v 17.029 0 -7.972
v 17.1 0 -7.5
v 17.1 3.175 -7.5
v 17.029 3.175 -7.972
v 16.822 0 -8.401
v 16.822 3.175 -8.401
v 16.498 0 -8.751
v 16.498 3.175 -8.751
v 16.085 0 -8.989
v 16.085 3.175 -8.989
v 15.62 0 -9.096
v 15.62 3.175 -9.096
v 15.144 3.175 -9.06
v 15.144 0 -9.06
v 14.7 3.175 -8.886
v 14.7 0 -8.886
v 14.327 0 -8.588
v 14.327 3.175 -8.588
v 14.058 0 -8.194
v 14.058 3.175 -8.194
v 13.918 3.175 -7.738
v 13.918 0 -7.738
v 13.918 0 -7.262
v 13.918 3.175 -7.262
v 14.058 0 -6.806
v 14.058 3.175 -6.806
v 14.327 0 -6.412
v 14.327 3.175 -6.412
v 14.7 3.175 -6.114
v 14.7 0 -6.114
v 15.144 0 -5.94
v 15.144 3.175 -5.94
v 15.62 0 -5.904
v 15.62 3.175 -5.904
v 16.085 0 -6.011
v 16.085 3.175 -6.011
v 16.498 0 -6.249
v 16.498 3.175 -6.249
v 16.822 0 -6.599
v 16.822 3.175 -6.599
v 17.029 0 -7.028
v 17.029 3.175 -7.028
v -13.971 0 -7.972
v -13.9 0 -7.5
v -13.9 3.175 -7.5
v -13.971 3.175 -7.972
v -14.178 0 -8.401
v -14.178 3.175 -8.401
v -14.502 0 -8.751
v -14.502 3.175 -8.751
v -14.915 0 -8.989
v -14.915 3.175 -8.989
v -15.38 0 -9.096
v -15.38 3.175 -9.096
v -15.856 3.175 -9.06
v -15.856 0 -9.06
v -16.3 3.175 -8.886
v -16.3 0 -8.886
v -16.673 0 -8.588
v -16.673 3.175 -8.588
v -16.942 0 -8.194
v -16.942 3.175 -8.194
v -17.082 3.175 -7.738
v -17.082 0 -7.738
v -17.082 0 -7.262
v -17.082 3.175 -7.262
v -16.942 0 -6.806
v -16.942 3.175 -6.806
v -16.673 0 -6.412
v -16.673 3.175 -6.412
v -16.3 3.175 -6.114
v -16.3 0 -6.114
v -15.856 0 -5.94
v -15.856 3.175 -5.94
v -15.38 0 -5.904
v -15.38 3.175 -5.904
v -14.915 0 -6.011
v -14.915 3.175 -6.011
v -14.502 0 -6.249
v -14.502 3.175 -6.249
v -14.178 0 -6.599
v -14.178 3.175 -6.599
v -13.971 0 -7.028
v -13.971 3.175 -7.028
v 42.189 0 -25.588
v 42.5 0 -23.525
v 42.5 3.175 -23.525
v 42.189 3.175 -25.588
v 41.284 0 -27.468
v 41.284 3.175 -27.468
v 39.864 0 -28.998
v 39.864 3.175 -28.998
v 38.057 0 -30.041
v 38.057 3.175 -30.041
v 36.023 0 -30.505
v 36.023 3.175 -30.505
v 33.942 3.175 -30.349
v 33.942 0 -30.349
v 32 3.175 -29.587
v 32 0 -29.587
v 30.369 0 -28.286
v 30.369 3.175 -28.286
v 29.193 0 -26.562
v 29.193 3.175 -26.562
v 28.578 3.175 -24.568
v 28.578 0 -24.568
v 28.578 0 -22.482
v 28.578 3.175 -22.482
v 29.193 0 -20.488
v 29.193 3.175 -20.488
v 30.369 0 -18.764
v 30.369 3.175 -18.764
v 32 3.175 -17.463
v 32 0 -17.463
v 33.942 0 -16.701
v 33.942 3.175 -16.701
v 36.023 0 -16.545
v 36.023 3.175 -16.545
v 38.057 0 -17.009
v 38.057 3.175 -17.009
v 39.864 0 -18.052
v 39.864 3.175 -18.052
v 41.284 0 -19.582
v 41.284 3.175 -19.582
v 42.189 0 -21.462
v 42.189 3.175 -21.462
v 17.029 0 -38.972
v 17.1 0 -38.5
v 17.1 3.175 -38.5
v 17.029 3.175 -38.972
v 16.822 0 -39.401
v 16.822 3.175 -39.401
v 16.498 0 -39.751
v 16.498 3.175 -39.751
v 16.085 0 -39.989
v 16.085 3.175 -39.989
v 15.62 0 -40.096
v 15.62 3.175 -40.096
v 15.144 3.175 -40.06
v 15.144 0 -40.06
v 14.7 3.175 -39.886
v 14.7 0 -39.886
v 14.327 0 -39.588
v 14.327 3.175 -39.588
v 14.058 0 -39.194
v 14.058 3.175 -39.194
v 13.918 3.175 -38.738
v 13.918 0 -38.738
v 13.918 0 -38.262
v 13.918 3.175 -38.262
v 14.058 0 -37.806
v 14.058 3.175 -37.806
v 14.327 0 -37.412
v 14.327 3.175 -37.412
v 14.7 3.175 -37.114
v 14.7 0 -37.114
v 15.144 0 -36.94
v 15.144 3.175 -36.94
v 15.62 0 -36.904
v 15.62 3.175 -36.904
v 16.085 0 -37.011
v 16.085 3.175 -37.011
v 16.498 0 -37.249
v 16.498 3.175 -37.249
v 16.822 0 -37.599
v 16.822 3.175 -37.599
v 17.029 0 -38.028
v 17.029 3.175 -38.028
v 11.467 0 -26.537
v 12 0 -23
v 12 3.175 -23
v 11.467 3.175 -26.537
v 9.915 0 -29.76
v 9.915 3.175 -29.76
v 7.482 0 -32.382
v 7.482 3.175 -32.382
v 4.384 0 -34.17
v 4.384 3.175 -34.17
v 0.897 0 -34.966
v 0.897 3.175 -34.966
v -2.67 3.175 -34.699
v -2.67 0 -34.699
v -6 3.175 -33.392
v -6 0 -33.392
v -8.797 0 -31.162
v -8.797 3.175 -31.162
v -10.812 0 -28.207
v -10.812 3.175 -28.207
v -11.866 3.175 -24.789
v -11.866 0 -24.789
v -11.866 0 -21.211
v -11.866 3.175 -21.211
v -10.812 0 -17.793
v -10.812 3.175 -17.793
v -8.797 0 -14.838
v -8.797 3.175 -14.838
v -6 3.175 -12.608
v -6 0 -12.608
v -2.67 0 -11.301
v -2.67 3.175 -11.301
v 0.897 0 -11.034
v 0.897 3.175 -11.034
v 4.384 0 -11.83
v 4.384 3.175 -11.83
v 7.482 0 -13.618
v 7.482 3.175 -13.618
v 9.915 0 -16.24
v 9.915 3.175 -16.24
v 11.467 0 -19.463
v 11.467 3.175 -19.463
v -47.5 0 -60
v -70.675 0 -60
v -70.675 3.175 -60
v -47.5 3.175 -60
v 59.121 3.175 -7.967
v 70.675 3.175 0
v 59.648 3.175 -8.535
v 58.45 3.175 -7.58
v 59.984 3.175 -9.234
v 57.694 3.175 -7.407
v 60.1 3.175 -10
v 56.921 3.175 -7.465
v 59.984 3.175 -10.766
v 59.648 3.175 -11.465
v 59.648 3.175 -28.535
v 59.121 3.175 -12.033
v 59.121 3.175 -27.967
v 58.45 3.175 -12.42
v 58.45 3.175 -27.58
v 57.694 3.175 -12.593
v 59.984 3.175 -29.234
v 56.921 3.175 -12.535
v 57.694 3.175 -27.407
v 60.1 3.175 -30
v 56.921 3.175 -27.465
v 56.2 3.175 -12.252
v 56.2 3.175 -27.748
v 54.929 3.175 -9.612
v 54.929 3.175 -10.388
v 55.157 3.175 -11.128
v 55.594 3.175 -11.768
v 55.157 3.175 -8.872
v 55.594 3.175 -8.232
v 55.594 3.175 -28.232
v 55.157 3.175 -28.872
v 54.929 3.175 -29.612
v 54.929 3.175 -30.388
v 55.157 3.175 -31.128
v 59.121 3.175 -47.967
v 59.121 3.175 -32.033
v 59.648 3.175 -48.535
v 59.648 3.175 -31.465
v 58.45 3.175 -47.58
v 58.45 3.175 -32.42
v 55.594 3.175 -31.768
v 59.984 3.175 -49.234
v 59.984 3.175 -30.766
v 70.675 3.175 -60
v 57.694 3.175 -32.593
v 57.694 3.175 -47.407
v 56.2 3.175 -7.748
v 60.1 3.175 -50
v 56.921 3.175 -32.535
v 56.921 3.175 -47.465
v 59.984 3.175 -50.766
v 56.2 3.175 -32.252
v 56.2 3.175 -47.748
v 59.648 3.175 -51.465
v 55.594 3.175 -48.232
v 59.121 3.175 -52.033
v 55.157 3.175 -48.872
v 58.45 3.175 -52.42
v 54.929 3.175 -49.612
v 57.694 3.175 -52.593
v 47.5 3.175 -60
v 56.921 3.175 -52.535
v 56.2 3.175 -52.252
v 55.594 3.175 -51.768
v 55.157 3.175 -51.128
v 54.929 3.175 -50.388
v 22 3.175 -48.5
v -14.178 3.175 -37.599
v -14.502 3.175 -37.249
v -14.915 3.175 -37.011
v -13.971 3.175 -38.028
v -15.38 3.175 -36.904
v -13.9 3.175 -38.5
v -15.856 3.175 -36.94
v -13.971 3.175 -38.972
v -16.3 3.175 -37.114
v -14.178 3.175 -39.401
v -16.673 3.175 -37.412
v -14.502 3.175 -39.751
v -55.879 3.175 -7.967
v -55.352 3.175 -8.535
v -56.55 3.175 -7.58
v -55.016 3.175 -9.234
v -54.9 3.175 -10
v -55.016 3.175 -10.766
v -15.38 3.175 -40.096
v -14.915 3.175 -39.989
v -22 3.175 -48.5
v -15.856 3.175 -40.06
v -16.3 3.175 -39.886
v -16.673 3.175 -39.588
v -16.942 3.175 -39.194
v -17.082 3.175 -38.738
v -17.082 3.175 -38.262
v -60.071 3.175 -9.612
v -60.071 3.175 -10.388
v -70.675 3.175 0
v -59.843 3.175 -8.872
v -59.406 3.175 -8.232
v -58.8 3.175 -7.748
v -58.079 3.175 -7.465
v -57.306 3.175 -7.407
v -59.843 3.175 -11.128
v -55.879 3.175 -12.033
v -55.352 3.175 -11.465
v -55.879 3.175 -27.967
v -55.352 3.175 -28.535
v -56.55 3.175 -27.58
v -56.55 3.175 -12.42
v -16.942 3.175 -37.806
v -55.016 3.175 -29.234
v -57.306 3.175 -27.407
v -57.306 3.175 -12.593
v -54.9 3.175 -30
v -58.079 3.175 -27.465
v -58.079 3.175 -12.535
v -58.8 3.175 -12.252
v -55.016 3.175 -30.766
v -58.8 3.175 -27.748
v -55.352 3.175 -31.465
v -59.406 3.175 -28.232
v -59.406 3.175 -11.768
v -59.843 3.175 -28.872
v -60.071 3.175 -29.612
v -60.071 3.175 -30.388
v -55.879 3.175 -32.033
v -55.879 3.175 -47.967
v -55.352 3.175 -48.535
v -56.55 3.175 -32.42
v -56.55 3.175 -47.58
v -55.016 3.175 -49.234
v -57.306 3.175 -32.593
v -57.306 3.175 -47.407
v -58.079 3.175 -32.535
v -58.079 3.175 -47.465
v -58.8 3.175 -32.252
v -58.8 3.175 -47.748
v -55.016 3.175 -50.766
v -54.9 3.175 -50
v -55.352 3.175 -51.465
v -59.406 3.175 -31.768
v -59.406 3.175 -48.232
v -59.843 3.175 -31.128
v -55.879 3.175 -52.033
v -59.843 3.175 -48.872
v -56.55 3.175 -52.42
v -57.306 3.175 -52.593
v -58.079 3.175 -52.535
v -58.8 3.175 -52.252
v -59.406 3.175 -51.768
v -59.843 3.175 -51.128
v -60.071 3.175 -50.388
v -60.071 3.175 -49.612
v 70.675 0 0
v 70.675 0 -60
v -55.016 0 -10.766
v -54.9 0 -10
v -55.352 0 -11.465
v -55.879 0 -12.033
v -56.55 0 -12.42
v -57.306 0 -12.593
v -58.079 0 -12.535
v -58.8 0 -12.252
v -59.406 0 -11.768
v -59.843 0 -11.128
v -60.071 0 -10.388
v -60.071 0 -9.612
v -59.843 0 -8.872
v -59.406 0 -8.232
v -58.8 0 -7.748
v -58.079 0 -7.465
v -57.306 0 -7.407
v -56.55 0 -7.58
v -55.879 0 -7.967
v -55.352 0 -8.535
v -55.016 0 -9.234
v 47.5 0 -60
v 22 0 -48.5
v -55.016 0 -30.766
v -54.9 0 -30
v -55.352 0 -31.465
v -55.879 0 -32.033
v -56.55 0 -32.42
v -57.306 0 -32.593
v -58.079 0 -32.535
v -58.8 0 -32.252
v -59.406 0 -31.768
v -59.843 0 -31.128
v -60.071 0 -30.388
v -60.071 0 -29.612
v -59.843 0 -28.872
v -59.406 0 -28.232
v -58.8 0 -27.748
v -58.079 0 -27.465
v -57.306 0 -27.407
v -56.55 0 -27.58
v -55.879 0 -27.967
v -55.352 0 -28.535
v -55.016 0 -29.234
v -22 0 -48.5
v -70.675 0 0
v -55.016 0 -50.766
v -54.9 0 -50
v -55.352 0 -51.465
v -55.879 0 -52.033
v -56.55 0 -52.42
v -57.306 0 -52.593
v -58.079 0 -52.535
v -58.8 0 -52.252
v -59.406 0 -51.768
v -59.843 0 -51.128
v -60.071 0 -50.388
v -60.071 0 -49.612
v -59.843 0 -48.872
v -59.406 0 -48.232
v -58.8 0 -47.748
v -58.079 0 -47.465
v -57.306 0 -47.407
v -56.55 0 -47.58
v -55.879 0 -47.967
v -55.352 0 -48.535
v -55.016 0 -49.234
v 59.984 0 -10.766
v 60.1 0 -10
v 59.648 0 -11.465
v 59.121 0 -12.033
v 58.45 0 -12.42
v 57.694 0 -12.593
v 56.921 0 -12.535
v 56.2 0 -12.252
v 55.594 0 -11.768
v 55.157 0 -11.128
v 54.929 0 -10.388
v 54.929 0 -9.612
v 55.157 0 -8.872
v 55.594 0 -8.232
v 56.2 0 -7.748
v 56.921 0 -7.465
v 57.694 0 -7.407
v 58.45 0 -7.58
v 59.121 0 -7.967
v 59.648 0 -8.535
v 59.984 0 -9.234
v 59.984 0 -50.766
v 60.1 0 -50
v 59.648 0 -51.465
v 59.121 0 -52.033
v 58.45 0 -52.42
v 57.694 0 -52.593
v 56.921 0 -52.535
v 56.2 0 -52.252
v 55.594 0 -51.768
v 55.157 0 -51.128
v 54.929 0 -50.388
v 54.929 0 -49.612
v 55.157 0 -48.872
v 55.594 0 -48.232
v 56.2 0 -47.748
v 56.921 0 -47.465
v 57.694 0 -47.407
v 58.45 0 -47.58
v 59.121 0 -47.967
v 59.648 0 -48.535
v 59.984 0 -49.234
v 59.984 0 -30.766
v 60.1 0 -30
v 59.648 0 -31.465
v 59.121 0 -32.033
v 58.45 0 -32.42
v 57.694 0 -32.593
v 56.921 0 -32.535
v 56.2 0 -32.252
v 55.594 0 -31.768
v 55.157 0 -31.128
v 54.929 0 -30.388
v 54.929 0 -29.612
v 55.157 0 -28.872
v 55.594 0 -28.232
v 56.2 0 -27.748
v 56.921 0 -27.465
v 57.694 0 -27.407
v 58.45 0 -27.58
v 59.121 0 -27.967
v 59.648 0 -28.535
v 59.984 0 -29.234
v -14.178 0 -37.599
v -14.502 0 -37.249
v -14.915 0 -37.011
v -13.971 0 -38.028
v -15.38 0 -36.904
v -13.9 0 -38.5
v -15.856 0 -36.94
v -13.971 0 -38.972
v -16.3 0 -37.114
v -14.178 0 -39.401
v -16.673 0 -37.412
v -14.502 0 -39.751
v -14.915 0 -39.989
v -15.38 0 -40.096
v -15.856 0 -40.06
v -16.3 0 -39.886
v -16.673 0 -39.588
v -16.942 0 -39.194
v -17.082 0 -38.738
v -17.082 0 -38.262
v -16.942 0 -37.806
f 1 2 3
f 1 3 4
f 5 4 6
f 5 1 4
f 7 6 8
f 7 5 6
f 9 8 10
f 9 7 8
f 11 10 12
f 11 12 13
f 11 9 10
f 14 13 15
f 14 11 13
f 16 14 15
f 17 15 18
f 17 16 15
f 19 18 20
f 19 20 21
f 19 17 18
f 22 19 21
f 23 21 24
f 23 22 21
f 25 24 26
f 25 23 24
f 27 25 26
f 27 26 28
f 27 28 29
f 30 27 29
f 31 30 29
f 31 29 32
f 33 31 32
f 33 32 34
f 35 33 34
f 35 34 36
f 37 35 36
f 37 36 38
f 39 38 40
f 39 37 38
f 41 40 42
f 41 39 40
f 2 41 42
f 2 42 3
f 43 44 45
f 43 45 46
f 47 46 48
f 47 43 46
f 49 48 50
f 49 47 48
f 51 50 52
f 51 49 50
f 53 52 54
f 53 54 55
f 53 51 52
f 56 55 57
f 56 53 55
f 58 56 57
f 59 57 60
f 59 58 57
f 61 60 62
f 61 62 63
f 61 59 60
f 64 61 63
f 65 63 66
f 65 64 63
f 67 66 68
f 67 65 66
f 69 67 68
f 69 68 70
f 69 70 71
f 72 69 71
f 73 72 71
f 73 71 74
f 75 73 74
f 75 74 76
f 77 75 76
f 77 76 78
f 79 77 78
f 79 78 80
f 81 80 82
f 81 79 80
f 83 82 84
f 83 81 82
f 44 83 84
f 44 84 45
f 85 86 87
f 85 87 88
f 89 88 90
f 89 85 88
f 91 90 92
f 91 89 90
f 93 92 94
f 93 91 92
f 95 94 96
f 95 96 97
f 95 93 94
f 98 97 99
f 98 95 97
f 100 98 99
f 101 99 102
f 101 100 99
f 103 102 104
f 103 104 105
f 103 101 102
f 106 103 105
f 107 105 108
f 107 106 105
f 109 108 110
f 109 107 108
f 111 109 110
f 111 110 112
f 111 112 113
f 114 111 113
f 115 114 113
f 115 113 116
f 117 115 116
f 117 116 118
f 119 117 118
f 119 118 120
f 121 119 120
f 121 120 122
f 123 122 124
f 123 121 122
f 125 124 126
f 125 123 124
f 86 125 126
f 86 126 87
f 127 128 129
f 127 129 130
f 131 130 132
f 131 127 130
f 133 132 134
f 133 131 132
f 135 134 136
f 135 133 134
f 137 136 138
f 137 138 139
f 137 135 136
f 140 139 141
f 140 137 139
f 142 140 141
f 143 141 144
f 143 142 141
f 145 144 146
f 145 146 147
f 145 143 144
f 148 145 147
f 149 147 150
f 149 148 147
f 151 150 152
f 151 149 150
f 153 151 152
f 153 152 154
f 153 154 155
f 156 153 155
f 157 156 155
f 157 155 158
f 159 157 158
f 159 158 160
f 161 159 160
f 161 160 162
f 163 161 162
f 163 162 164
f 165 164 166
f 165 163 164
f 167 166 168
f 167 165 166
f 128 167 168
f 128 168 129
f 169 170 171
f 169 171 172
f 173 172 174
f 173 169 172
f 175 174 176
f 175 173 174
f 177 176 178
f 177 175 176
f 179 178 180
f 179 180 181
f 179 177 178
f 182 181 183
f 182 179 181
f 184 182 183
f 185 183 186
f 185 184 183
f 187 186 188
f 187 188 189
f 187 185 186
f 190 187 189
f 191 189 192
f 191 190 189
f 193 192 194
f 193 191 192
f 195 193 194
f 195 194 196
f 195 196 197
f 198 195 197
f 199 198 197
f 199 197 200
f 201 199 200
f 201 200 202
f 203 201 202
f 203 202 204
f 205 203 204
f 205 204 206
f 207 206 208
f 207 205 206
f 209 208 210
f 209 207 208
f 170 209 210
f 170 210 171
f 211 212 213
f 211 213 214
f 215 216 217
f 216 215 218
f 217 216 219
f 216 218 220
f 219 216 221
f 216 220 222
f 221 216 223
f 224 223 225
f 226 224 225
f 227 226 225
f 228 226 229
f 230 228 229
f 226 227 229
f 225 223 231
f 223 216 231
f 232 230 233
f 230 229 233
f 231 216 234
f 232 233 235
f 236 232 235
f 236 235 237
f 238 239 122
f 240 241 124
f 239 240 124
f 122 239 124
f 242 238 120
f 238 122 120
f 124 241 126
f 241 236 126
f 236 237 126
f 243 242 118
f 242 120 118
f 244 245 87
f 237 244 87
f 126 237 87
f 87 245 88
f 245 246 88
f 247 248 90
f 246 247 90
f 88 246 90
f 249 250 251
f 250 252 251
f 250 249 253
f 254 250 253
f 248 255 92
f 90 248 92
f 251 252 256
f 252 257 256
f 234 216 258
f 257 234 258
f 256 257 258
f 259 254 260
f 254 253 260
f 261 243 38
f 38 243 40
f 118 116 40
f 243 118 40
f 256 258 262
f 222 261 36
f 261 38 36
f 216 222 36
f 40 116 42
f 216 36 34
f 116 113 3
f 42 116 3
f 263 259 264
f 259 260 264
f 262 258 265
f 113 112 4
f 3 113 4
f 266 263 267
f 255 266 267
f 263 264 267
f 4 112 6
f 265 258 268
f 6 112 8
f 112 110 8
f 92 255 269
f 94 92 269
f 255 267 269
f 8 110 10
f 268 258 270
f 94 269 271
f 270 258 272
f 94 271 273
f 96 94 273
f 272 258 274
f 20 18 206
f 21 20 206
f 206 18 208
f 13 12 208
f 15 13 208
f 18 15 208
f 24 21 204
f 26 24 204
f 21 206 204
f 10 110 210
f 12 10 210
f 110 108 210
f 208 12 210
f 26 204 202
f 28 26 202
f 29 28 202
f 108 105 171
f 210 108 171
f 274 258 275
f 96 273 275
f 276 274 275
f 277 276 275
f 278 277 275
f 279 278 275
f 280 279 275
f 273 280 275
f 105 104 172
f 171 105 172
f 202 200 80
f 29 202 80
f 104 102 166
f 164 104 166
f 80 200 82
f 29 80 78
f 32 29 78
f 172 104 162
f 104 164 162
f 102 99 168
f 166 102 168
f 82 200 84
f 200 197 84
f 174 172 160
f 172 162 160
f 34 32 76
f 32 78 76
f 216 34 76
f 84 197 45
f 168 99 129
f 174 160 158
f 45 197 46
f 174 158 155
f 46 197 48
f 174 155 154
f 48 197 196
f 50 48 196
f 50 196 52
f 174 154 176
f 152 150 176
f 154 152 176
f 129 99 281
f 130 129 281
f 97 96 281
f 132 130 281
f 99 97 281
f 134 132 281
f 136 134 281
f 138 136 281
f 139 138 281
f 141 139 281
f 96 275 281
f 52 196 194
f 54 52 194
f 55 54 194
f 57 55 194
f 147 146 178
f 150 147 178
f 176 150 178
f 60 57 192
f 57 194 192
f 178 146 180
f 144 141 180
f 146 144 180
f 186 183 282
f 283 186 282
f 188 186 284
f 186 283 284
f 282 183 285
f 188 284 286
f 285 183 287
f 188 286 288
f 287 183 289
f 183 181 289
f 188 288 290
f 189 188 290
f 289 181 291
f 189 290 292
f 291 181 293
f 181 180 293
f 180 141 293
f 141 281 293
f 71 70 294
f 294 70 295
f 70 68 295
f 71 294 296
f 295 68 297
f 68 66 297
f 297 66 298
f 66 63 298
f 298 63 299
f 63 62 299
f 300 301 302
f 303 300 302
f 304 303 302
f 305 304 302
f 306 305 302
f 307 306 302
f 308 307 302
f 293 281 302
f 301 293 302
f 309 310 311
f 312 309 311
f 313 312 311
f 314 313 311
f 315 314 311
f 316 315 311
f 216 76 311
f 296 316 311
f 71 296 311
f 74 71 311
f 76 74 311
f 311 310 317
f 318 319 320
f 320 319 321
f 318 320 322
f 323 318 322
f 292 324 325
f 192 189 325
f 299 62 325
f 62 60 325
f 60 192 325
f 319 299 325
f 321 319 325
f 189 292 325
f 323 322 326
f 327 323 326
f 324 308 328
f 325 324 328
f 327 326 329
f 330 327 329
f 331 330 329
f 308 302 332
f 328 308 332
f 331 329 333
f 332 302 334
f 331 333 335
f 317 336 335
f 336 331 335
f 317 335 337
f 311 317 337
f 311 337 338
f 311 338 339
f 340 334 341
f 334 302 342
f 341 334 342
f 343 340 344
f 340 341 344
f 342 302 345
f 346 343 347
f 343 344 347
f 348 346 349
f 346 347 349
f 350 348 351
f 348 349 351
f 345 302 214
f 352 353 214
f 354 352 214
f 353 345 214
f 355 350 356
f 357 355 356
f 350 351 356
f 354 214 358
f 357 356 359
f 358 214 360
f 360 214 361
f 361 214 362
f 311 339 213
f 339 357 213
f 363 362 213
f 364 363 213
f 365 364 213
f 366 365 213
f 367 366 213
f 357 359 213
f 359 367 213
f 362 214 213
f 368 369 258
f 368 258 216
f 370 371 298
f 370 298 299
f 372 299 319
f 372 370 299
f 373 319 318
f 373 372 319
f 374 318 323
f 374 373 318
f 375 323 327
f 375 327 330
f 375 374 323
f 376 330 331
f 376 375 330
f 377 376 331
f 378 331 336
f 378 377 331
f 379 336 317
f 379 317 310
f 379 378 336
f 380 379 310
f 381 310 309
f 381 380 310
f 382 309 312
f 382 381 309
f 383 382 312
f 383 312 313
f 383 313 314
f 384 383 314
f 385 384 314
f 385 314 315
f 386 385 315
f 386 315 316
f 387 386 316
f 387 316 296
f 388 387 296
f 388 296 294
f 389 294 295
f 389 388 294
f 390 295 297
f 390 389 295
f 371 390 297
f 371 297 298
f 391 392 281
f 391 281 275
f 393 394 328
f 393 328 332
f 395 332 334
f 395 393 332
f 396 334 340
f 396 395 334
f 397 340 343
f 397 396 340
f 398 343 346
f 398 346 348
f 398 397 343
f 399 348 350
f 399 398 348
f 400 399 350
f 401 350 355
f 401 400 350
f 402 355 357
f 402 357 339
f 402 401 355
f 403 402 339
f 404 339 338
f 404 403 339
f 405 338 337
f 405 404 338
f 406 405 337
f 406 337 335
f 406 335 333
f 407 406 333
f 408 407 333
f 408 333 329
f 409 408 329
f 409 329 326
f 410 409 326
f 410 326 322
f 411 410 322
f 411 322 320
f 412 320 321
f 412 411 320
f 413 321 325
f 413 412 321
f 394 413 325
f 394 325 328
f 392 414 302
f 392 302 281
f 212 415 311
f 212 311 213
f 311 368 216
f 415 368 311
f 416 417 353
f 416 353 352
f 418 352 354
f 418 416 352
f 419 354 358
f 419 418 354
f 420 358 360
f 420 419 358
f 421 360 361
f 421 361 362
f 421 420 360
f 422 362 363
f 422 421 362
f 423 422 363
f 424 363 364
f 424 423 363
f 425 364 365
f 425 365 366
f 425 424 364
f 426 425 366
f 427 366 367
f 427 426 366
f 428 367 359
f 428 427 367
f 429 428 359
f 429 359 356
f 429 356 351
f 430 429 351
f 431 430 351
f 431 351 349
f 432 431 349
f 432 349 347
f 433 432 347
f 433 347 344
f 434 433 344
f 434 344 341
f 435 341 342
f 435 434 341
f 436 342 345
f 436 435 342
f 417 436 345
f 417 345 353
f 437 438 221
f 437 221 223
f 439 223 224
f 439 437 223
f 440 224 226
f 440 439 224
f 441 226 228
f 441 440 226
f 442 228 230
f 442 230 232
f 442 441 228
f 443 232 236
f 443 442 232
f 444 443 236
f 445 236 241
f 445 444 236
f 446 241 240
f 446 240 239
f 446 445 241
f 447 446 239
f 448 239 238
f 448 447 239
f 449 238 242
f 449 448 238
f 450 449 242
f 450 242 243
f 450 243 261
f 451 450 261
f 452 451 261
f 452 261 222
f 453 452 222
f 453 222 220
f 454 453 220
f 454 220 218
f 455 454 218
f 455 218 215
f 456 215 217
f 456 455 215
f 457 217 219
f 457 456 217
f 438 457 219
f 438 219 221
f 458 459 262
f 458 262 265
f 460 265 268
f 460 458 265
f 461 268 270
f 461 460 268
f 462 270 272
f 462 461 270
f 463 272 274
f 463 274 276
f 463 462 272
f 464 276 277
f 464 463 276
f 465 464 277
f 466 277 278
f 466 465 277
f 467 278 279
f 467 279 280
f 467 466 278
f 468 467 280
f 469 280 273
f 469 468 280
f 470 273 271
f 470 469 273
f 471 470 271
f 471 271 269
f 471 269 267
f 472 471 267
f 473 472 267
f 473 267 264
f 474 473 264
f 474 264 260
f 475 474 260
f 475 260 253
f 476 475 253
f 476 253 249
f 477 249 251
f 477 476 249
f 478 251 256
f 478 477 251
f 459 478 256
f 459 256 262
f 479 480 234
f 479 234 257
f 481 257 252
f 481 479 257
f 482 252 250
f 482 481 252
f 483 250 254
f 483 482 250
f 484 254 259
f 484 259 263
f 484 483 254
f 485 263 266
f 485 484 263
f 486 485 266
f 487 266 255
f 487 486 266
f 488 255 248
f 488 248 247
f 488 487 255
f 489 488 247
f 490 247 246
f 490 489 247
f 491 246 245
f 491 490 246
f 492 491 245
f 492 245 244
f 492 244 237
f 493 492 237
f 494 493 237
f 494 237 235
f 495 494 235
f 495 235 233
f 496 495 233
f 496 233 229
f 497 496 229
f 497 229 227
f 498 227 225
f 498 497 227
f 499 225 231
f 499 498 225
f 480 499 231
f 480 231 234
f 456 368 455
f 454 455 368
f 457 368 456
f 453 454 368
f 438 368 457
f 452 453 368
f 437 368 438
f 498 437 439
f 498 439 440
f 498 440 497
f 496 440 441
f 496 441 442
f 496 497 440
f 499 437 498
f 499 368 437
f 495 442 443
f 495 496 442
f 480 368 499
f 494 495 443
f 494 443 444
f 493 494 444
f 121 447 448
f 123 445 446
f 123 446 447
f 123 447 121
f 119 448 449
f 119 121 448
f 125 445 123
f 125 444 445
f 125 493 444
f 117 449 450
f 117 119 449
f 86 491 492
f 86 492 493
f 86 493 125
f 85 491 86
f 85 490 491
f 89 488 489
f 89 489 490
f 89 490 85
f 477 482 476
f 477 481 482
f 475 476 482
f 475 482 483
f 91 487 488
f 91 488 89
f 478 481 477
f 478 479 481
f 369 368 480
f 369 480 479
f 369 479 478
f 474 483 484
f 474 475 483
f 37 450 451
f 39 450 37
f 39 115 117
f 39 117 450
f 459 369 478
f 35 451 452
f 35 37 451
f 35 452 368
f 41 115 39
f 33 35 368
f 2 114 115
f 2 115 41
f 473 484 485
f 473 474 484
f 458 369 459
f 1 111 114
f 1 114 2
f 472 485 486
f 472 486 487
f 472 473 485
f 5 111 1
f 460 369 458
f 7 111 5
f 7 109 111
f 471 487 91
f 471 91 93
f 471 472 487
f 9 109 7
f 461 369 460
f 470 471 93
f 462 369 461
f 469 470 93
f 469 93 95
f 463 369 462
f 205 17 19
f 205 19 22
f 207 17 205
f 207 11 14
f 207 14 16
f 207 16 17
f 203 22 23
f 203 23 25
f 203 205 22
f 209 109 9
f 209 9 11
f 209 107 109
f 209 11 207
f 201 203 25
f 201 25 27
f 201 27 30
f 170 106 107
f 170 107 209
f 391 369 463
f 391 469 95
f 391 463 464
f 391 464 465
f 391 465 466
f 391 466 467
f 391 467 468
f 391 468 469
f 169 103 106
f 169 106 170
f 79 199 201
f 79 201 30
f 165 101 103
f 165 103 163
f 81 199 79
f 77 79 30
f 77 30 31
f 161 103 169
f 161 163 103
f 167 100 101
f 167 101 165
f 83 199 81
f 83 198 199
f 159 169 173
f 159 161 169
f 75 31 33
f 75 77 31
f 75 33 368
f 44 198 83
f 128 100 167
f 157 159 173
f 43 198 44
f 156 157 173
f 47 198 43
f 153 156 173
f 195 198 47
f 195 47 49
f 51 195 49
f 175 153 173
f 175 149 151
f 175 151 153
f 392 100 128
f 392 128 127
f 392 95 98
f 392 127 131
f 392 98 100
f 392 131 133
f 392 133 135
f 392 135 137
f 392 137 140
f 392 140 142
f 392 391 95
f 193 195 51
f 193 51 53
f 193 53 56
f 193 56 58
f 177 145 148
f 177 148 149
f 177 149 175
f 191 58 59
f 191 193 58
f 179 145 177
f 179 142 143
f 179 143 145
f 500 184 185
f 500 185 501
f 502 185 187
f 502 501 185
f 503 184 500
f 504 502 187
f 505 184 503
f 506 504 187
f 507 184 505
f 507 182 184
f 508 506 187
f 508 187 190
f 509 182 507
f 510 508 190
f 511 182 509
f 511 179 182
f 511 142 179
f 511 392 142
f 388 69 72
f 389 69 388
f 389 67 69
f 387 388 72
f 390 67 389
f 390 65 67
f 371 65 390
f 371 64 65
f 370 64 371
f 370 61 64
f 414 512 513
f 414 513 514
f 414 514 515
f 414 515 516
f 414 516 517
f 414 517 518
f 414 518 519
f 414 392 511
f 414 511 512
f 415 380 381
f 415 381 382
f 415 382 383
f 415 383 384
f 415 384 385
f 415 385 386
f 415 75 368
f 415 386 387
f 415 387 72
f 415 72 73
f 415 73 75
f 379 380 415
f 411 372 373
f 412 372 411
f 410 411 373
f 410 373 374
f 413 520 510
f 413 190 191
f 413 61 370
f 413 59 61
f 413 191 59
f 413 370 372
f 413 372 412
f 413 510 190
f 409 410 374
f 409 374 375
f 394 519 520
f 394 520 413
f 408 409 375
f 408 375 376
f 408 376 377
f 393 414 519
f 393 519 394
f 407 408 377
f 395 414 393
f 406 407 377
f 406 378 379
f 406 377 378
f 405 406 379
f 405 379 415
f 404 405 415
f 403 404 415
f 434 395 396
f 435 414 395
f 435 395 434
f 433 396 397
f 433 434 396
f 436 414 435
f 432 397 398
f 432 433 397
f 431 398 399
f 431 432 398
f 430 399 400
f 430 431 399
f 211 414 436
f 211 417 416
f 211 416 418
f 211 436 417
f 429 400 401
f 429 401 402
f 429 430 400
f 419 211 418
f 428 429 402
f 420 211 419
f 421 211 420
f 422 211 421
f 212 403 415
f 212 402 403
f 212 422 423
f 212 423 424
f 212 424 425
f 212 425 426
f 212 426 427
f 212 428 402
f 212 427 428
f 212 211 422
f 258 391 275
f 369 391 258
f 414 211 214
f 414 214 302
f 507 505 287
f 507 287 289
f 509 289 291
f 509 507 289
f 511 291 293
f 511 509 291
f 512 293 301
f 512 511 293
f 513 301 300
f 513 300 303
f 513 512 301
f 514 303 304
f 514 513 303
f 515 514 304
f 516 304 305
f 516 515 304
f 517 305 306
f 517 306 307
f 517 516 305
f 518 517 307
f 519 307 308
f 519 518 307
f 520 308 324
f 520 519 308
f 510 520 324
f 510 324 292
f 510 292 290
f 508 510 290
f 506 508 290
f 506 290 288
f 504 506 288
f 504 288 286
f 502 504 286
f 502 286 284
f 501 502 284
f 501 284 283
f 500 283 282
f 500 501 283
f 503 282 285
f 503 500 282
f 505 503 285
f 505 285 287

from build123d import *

# Parameters (mm, degrees)
SKETCH2_R           = 2.6
SKETCH2_R_2         = 12
SKETCH2_R_3         = 1.6
SKETCH2_R_4         = 7
BOSS_EXTRUDE1_DEPTH = 3.175


with BuildPart() as part:
    # Sketch2 → Boss-Extrude1 (new body)
    with BuildSketch(Plane(origin=(0, 0, 0), x_dir=(1, 0, 0), z_dir=(0, 1, 0))):
        Polygon((70.675, 0), (-70.675, 0), (-70.675, 60), (-47.5, 60), (-22, 48.5), (22, 48.5), (47.5, 60), (70.675, 60), align=None)
        with Locations((-57.5, 30)):
            Circle(SKETCH2_R, mode=Mode.SUBTRACT)
        with Locations((-57.5, 50)):
            Circle(SKETCH2_R, mode=Mode.SUBTRACT)
        with Locations((-57.5, 10)):
            Circle(SKETCH2_R, mode=Mode.SUBTRACT)
        with Locations((0, 23)):
            Circle(SKETCH2_R_2, mode=Mode.SUBTRACT)
        with Locations((-15.5, 38.5)):
            Circle(SKETCH2_R_3, mode=Mode.SUBTRACT)
        with Locations((15.5, 38.5)):
            Circle(SKETCH2_R_3, mode=Mode.SUBTRACT)
        with Locations((15.5, 7.5)):
            Circle(SKETCH2_R_3, mode=Mode.SUBTRACT)
        with Locations((-15.5, 7.5)):
            Circle(SKETCH2_R_3, mode=Mode.SUBTRACT)
        with Locations((57.5, 10)):
            Circle(SKETCH2_R, mode=Mode.SUBTRACT)
        with Locations((57.5, 30)):
            Circle(SKETCH2_R, mode=Mode.SUBTRACT)
        with Locations((57.5, 50)):
            Circle(SKETCH2_R, mode=Mode.SUBTRACT)
        with Locations((35.5, 23.525)):
            Circle(SKETCH2_R_4, mode=Mode.SUBTRACT)
    extrude(amount=BOSS_EXTRUDE1_DEPTH)


solid = part.part
